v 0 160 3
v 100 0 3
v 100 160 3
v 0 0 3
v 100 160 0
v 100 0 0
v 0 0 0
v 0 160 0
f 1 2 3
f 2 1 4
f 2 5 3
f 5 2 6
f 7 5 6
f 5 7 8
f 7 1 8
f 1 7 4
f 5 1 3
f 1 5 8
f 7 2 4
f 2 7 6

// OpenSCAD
// file: card_lib.scad
$fa = 6;
$fs = 0.875;

face_thickness = 3;
card_height = 160;
card_width = 100;
text_size = 9;

module card_face() {
    cube([card_width, card_height, face_thickness]);
}

module text_line(text, x, y) {
    translate([x, y])
    text(text, text_size, "Lato:style=Black");
}

module render_text() {
    text_line("To Suzi", 10, card_height - text_size - 16);
    text_line("Merry 3D", 10, card_height / 2 + 7);
    text_line("christmas!", 10, card_height / 2 - 7);
    text_line("The most love", 10, 30);
    text_line("from Jacek <3", 10, 16);
}
// main file
include<card_lib.scad>;

$fa = 6;
$fs = 0.875;

// Card back
difference() {
    card_face();

    translate([0, 0, 1.001]) {
        render_text();
    }
}
